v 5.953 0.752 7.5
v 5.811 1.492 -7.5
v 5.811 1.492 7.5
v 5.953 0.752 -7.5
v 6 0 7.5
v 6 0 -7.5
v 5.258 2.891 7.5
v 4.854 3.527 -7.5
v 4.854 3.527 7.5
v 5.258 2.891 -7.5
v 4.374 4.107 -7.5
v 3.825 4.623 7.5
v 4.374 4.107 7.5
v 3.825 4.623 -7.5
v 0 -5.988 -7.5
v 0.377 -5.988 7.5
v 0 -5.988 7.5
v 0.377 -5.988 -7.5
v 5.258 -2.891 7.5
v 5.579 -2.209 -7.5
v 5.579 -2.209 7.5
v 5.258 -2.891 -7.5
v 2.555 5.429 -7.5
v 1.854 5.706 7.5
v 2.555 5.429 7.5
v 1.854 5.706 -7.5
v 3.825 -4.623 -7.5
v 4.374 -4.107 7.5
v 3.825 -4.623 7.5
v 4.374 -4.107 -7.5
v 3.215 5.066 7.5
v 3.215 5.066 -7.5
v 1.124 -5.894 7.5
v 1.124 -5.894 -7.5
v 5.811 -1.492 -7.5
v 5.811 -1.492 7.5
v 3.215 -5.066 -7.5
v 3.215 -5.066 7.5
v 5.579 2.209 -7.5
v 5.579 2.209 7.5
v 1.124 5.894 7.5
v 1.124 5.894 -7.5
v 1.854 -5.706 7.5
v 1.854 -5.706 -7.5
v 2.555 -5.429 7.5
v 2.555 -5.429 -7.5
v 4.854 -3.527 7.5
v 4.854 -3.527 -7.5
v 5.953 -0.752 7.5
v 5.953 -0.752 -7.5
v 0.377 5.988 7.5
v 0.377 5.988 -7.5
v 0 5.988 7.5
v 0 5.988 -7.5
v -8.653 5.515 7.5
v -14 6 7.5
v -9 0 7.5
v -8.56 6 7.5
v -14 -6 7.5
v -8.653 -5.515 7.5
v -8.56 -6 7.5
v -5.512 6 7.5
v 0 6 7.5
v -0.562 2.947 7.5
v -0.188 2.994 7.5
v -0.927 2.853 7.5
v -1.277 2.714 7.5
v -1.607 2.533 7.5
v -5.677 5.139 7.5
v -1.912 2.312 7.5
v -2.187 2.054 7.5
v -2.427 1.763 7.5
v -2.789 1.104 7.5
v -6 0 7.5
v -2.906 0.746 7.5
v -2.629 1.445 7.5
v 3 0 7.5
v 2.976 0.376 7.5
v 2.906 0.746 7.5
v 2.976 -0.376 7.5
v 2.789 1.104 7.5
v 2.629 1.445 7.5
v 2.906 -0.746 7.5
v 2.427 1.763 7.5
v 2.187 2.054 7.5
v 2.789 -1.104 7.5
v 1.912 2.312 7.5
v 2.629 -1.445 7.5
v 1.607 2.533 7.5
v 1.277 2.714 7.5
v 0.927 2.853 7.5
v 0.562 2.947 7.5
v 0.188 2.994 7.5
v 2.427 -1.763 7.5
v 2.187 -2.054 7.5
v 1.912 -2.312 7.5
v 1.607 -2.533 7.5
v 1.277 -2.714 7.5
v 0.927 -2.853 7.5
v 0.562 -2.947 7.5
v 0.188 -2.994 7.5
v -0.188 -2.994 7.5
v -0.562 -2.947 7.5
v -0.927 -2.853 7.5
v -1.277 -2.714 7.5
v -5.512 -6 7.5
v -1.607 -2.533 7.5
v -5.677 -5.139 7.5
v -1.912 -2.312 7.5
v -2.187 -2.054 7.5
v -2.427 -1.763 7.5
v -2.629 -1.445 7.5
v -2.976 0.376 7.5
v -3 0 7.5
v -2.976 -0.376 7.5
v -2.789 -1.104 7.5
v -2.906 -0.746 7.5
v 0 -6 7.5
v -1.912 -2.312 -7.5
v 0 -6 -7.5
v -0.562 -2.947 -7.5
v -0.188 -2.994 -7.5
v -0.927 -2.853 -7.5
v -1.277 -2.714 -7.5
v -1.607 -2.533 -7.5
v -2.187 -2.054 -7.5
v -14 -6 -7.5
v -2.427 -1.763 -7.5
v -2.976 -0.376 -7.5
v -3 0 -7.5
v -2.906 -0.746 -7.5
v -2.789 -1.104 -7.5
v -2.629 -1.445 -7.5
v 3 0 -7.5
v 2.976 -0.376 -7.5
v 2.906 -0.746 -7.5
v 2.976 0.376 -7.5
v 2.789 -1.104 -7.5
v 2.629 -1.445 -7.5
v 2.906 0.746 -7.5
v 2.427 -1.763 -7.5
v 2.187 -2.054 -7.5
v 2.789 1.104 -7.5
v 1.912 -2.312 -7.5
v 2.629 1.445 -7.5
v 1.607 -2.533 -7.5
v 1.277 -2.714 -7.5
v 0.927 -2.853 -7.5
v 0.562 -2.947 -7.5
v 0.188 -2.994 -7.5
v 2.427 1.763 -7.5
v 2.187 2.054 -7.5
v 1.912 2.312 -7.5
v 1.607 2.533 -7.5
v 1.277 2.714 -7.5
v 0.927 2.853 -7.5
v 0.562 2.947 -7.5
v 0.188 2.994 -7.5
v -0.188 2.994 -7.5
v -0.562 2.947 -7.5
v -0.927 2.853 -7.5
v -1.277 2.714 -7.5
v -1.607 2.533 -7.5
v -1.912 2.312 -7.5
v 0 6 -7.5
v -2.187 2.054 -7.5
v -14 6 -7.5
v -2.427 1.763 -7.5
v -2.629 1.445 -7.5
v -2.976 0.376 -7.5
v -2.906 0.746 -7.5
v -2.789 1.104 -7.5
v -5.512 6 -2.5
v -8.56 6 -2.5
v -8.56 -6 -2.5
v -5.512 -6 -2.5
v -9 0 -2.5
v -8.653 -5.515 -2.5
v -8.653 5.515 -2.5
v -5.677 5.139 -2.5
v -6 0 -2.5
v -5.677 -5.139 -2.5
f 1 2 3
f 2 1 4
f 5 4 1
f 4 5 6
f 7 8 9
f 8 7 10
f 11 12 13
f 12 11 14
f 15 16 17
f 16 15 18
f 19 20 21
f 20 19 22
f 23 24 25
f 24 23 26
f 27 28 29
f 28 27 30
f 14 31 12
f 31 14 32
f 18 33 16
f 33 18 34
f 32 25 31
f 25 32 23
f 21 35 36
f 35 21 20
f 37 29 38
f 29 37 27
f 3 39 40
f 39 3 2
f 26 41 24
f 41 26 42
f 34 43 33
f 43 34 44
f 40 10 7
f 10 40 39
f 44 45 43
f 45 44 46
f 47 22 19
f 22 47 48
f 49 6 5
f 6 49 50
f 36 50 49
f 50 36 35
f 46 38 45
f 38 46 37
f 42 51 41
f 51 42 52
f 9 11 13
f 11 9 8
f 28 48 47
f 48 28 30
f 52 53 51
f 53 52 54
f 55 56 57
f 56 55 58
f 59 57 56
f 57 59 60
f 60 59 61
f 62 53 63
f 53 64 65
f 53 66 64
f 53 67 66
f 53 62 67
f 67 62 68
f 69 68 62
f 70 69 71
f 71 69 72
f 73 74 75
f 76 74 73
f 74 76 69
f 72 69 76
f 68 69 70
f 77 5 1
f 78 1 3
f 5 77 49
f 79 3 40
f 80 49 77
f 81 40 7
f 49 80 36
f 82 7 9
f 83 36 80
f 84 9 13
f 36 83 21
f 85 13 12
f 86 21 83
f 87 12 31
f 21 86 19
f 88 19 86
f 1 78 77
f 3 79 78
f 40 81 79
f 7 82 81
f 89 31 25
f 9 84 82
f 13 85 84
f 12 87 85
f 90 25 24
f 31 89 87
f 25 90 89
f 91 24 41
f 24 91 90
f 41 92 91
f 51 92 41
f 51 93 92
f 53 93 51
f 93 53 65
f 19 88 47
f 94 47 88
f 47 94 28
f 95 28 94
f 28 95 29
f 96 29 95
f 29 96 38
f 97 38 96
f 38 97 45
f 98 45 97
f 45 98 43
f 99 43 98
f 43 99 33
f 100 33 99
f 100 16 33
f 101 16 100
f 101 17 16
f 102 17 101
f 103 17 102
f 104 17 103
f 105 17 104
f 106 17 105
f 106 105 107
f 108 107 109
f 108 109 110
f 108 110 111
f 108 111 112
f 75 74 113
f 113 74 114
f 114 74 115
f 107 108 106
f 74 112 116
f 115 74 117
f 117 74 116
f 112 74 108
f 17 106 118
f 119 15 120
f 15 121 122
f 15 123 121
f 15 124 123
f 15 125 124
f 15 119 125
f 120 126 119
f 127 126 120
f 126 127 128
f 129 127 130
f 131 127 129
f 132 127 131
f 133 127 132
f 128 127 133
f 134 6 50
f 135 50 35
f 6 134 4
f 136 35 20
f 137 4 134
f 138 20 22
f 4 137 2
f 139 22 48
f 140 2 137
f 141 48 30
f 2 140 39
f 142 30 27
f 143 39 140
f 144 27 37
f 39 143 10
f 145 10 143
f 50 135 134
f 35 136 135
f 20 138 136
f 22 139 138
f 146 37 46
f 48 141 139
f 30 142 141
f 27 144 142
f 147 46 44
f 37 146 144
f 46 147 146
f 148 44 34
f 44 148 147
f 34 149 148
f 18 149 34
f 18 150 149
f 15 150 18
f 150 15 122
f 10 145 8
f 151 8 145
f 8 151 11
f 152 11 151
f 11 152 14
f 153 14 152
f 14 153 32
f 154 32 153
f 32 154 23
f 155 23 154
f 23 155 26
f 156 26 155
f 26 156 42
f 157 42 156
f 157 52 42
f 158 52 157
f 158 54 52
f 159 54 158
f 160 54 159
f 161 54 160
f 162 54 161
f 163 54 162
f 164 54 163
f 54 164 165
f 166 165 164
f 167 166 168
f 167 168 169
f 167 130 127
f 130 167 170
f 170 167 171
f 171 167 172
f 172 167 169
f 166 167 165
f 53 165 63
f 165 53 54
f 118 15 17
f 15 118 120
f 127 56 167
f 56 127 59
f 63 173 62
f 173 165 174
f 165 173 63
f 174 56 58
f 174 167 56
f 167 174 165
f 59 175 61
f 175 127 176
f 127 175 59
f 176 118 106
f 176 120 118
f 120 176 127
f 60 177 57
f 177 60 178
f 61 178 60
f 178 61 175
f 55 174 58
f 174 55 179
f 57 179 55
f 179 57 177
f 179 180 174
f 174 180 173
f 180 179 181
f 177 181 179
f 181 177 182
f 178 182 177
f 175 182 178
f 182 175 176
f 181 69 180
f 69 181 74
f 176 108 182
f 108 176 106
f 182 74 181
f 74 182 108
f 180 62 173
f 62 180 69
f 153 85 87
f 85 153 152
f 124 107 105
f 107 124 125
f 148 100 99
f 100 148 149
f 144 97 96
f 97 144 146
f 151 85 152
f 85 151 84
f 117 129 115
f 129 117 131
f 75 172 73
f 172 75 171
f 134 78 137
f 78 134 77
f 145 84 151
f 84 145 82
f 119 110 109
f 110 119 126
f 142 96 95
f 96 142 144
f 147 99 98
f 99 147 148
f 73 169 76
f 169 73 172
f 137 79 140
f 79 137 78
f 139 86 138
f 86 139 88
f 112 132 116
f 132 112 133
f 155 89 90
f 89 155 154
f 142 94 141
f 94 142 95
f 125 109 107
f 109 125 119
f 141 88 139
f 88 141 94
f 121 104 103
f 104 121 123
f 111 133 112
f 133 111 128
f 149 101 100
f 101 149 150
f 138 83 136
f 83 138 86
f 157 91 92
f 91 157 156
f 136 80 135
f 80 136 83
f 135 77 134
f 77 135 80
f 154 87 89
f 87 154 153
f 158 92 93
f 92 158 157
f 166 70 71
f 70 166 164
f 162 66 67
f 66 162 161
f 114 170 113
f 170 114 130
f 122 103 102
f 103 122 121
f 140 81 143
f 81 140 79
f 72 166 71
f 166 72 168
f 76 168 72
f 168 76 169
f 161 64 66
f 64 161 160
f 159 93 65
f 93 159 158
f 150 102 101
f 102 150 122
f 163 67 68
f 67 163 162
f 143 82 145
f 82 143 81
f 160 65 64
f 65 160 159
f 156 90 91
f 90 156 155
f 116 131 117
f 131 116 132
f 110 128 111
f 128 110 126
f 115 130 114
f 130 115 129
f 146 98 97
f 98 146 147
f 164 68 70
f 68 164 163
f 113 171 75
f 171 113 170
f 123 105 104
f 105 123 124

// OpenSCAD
// Written by Volksswitch <www.volksswitch.org> 
// based on the Straw Holder design by NoHands: https://www.thingiverse.com/thing:1953484
// 
// To the extent possible under law, the author(s) have dedicated all
// copyright and related and neighboring rights to this software to the
// public domain worldwide. This software is distributed without any
// warranty.
//
// You should have received a copy of the CC0 Public Domain
// Dedication along with this software.
// If not, see <http://creativecommons.org/publicdomain/zero/1.0/>.
//


//------------------------------------------------------------------
// User Inputs
//------------------------------------------------------------------

/*[Parameters]*/
straw_diameter = 6;
straw_holder_height = 15;
cup_diameter=88;
cup_wall_thickness=3;

/*[Hidden]*/
straw_dia = straw_diameter;
straw_radius=straw_dia/2;
straw_wall=3;
cup_radius=cup_diameter/2;
tab_length=straw_radius+straw_wall+cup_wall_thickness+5;
$fn=50;

difference(){

	union(){
		cylinder(r=straw_radius+straw_wall,h=straw_holder_height,center=true);
		translate([-tab_length/2,0,0])
		cube([tab_length,straw_dia+2*straw_wall,straw_holder_height],center=true);
	}

	cylinder(r=straw_radius,h=straw_holder_height+0.05,center=true);

	difference(){
		translate([cup_radius-straw_radius-straw_wall-cup_wall_thickness,0,5])
		cylinder(r=cup_radius,h=straw_holder_height,center=true);
		translate([cup_radius-straw_radius-straw_wall-cup_wall_thickness,0,5])
		cylinder(r=cup_radius-cup_wall_thickness,h=straw_holder_height+0.05,center=true);
	}
}
